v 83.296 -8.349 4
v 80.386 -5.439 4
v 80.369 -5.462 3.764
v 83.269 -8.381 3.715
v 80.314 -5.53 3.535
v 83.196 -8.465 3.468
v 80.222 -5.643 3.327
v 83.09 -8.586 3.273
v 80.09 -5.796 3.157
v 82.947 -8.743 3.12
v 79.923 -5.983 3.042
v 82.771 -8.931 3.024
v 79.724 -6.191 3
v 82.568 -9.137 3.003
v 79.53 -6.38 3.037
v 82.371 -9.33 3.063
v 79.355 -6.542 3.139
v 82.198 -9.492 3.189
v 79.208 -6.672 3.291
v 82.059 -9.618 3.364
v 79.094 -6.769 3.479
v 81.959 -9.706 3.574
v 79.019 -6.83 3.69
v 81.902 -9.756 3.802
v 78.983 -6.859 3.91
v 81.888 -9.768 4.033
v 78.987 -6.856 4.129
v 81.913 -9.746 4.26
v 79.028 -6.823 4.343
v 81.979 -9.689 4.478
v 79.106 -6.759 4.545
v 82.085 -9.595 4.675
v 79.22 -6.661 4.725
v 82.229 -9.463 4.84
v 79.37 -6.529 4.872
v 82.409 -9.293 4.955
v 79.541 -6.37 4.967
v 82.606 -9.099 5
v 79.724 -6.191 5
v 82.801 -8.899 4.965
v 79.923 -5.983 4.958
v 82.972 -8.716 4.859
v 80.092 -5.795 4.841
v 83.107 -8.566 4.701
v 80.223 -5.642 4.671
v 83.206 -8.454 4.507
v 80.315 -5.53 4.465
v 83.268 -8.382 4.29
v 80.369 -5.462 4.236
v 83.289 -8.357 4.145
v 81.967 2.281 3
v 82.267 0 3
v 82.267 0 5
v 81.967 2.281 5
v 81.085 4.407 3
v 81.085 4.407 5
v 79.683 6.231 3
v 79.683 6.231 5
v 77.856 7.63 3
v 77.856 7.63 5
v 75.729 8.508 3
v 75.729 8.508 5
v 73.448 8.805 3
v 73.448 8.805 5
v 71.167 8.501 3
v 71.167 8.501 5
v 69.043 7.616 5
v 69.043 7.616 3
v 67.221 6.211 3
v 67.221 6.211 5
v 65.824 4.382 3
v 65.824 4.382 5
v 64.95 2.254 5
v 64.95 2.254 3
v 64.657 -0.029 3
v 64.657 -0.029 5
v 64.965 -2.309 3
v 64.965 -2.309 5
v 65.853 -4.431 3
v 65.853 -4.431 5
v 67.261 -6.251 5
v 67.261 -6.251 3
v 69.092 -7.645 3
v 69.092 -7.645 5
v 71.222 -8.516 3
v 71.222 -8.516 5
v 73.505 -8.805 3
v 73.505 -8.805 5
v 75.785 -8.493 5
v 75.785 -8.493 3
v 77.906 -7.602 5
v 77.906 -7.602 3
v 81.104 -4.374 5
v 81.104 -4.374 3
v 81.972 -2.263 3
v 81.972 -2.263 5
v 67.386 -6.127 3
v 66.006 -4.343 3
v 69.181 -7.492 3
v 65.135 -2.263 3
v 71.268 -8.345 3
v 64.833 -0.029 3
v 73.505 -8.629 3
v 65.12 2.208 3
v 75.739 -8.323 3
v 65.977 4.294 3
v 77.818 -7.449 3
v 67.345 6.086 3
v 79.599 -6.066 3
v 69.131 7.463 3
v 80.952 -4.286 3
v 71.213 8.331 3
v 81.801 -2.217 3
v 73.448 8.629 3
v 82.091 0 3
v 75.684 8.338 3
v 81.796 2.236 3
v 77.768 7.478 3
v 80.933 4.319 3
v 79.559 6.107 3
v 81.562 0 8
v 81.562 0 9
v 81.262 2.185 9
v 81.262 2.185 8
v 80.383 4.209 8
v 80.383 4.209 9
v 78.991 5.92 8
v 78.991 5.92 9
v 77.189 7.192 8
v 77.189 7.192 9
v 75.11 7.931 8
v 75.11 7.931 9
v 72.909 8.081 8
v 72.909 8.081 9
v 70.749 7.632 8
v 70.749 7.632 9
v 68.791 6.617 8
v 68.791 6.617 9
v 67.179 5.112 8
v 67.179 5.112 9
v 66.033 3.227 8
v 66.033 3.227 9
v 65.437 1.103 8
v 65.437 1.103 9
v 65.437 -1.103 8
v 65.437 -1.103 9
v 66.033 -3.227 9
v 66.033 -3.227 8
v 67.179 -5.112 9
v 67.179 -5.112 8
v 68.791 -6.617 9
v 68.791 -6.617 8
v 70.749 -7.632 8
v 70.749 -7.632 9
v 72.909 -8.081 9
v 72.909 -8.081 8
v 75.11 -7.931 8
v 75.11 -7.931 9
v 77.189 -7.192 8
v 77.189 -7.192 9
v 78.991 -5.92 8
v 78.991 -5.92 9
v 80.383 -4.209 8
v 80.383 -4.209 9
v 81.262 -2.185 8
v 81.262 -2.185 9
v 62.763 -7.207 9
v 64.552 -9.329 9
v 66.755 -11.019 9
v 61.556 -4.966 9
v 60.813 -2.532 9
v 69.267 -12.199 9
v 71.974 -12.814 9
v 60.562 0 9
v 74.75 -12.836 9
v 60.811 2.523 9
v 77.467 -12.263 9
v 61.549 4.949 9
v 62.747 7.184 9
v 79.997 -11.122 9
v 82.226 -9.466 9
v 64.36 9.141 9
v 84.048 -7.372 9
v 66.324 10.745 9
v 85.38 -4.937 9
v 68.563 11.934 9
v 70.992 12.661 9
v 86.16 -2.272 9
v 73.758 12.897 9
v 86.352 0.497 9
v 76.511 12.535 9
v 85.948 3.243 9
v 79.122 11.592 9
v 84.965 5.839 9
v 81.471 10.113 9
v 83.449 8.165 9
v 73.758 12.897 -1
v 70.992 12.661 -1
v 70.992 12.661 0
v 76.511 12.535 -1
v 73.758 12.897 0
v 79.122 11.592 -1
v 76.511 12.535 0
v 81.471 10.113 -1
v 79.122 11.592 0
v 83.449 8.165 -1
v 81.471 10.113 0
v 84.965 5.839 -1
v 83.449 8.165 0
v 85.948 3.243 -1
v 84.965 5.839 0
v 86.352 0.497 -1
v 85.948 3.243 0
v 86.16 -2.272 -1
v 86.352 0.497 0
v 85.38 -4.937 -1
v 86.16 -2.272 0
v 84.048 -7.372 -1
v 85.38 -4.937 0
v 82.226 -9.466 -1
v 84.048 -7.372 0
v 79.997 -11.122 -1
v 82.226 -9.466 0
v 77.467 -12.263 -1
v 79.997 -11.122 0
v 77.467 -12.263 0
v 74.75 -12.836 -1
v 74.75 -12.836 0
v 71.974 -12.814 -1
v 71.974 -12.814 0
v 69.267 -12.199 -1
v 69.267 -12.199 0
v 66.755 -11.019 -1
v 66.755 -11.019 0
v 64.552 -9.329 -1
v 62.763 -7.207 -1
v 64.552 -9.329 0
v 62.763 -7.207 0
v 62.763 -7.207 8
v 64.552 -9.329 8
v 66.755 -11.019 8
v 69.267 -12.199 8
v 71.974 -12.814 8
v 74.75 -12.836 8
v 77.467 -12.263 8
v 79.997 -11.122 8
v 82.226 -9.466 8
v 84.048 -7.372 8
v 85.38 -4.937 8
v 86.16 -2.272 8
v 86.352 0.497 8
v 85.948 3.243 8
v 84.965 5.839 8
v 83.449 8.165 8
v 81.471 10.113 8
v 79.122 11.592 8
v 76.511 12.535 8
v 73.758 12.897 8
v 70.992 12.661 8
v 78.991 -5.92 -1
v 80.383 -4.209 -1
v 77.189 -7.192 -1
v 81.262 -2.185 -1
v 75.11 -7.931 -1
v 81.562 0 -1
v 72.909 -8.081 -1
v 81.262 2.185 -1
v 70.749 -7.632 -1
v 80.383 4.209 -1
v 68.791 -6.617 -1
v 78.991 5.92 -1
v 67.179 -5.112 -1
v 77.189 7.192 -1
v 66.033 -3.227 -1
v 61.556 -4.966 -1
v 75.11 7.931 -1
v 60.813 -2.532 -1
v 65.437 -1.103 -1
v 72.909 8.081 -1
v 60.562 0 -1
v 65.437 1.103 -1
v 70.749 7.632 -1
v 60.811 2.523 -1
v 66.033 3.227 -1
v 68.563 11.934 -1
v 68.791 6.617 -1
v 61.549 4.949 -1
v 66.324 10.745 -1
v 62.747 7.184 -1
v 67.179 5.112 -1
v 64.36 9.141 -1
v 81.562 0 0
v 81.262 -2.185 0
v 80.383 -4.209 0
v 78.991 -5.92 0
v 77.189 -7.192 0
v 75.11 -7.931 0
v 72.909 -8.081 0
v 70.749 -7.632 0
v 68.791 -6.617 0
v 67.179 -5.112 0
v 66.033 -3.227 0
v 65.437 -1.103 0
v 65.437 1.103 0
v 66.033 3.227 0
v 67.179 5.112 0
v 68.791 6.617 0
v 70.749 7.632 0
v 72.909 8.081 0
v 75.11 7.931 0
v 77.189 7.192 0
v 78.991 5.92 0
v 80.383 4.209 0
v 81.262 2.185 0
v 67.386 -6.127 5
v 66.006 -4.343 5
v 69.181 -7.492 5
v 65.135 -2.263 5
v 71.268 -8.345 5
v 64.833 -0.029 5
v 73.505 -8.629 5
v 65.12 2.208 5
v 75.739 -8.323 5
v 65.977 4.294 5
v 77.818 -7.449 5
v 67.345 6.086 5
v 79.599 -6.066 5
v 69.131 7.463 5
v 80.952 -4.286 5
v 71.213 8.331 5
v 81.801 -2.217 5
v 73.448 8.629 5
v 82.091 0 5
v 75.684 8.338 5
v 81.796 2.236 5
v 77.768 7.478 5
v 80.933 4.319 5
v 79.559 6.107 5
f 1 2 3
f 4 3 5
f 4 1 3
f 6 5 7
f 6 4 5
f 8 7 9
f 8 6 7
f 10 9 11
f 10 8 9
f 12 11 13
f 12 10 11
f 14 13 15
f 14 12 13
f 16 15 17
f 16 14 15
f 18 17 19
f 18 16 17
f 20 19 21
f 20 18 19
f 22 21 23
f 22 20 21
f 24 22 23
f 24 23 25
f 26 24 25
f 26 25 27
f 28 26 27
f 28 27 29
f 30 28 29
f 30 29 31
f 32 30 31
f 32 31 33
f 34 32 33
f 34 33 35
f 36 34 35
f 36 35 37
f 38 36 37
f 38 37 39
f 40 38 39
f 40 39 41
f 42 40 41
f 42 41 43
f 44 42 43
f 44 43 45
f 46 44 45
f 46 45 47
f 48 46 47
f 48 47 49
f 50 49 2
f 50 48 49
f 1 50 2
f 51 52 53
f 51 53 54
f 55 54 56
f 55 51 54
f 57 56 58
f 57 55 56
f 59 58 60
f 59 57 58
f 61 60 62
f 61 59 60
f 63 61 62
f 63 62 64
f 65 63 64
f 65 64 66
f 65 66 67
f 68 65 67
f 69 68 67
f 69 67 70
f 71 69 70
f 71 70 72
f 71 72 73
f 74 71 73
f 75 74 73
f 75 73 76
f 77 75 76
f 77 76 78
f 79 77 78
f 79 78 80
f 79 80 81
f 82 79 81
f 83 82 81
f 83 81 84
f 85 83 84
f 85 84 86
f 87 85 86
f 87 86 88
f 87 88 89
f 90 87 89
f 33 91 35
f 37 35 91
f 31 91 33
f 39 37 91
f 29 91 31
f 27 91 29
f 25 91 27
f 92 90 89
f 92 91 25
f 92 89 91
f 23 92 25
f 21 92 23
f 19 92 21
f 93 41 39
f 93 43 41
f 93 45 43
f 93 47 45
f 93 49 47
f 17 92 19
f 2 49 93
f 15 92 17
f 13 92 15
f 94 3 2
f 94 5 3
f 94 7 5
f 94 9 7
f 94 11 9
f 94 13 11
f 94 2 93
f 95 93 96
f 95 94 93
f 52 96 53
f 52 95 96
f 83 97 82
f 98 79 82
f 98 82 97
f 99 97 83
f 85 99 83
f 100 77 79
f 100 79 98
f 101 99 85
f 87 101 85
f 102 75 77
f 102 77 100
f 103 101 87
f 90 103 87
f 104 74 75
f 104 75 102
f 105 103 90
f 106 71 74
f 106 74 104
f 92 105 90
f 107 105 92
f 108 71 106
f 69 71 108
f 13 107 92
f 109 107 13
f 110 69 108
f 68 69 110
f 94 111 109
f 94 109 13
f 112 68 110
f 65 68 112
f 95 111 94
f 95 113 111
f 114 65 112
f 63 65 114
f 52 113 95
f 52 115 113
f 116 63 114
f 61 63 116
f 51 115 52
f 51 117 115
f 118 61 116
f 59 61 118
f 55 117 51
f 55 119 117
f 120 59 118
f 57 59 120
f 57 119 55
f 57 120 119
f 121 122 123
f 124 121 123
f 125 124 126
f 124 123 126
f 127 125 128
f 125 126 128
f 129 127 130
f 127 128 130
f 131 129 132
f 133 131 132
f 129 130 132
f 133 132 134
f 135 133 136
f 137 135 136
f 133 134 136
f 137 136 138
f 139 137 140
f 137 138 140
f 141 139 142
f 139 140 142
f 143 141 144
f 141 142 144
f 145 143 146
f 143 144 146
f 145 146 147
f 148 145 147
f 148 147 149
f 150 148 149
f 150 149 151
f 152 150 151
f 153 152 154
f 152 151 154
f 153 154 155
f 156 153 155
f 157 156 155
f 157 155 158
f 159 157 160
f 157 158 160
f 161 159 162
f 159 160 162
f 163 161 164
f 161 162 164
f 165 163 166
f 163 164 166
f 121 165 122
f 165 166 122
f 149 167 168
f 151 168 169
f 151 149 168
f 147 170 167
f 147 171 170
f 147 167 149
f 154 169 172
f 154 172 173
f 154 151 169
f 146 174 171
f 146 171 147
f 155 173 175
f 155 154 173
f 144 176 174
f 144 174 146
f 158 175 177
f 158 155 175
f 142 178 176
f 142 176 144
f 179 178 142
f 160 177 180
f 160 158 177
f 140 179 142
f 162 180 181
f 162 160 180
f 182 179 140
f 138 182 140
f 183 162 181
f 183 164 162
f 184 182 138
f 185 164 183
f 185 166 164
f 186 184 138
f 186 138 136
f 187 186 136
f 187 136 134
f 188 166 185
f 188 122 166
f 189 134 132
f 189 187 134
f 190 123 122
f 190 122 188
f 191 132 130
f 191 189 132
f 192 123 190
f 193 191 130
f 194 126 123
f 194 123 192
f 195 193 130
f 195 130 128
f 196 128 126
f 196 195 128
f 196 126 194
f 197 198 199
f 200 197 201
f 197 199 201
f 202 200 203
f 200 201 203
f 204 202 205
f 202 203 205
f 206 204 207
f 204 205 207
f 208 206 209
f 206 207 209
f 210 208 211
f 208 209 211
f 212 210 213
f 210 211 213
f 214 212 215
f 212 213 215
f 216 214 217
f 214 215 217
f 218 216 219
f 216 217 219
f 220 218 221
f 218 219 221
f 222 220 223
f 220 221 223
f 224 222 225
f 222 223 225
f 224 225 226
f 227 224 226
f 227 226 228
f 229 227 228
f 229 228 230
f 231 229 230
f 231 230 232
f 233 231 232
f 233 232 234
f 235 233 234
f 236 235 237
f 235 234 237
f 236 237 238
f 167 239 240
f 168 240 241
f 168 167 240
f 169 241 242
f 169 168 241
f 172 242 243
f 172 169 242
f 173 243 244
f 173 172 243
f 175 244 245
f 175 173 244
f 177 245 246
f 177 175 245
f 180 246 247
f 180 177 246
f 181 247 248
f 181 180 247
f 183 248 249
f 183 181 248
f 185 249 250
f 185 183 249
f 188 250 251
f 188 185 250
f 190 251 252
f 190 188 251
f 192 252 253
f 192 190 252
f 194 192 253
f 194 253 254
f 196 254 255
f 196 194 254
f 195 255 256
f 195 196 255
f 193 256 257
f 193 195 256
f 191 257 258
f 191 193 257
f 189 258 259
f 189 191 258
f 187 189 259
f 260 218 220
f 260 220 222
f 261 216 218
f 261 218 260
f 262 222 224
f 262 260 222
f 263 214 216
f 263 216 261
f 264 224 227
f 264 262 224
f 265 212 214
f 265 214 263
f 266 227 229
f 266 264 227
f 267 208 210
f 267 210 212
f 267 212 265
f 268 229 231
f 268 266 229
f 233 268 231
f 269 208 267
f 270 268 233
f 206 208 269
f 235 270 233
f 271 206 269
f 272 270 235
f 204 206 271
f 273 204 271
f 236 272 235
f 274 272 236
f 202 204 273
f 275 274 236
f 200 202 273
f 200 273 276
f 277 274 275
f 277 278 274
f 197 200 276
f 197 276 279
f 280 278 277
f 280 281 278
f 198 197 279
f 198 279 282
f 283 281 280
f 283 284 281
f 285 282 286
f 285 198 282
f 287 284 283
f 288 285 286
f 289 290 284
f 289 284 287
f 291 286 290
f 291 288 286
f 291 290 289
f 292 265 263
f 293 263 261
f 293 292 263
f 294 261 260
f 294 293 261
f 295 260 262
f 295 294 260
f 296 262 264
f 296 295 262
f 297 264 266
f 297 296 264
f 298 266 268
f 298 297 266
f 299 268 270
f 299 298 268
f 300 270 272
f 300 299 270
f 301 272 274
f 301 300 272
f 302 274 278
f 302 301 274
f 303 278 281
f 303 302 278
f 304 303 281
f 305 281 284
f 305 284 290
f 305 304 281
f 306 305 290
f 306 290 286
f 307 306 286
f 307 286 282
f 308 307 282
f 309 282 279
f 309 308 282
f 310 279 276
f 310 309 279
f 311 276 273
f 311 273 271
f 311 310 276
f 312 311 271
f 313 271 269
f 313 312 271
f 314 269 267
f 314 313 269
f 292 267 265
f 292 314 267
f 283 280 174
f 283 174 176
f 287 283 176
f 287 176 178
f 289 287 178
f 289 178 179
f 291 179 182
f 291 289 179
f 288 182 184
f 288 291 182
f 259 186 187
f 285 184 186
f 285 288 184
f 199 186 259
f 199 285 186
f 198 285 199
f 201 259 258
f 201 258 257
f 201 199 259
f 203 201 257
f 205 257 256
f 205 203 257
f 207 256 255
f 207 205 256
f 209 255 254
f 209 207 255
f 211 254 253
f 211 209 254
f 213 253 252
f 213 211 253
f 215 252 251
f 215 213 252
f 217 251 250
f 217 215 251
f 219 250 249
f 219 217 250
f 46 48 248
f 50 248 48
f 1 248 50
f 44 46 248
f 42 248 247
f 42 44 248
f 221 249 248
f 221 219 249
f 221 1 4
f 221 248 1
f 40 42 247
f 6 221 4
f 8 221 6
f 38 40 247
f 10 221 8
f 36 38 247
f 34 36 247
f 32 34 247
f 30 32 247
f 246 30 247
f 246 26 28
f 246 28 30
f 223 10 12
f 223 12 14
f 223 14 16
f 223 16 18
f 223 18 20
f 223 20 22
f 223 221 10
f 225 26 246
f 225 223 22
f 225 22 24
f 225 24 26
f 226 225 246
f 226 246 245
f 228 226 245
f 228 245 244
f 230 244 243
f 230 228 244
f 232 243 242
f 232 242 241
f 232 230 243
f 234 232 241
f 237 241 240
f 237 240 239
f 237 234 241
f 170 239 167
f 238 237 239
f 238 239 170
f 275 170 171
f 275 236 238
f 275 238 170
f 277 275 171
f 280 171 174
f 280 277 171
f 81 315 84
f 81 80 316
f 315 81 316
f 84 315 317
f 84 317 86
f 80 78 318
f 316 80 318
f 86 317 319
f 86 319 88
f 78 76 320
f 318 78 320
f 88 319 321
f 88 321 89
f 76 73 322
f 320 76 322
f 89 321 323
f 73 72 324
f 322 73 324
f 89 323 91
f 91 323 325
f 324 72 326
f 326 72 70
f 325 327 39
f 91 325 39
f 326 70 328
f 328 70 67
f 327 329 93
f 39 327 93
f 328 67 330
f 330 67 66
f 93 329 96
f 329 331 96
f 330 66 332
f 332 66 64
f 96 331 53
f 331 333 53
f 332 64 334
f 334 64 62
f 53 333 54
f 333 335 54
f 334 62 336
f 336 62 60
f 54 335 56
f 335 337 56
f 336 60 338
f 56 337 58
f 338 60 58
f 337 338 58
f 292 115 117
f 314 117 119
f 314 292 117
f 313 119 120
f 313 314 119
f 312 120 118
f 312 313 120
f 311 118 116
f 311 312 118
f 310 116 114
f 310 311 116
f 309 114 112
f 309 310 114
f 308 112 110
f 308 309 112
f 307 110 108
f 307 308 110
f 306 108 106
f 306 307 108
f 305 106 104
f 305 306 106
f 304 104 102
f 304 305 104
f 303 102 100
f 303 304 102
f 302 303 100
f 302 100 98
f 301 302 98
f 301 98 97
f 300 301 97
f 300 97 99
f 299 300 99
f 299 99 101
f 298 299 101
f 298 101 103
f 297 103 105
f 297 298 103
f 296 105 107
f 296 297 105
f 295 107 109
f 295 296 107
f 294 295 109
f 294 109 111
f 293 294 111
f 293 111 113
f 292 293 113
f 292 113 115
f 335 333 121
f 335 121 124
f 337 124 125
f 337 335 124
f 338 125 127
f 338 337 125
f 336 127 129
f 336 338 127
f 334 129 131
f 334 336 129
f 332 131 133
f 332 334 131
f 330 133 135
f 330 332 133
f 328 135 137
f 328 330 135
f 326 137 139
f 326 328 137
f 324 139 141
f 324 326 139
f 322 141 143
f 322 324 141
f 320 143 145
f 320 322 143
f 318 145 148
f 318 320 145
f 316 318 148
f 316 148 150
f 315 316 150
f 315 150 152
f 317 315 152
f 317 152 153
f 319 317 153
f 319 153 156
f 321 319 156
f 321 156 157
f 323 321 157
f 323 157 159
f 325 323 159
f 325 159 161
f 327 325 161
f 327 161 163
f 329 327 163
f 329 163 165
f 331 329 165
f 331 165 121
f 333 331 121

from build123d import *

# Parameters (mm, degrees)
SKETCH1_R               = 12.9
SKETCH1_R_2             = 8.1
BOSS_EXTRUDE1_DEPTH     = 8
CUT_EXTRUDE1_DEPTH      = 1
CUT_EXTRUDE1_DEPTH_BACK = 1
SKETCH3_R               = 8.805307923
SKETCH4_R               = 1
CUT_EXTRUDE2_DEPTH      = 6
FILLET1_R               = 3
FILLET2_R               = 5
SKETCH5_R               = 1
CUT_EXTRUDE3_DEPTH      = 10
DRAFT4_ANGLE            = -10
DRAFT6_ANGLE            = -10
SKETCH6_R               = 1
CUT_EXTRUDE4_DEPTH      = 10
BOSS_EXTRUDE3_START     = 1
SKETCH7_R               = 8.1
BOSS_EXTRUDE3_DEPTH     = 1
SKETCH11_R              = 8.1
BOSS_EXTRUDE4_DEPTH     = 1
SKETCH12_OUTSIDE_W      = 157.242
SKETCH12_OUTSIDE_H      = 107.242
SKETCH12_OUTSIDE_R      = 12.9
CUT_EXTRUDE5_DEPTH      = 108.3070569


with BuildPart() as part:
    # Sketch1 → Boss-Extrude1 (new body)
    # profile 1 of 8: a face of its own
    with BuildSketch(Plane.XY):
        with Locations((-26.538003558, 0)):
            Circle(SKETCH1_R)
        with Locations((-26.538003558, 0)):
            Circle(SKETCH1_R_2, mode=Mode.SUBTRACT)
    # profile 2 of 8: a face of its own
    with BuildSketch(Plane.XY):
        with BuildLine():
            ThreePointArc((-21.664910941, 11.944160429), (-17.46502072, 9.170113544), (-14.646409889, 5))
            Line((-14.646409889, 5), (-14.466935746, 5))
            Line((-14.466935746, 5), (18.588903825, 38.055839571))
            ThreePointArc((18.588903825, 38.055839571), (14.340318965, 40.878322523), (11.517836013, 45.126907383))
            Line((11.517836013, 45.126907383), (-21.664910941, 11.944160429))
        make_face()
    # profile 3 of 8: a face of its own
    with BuildSketch(Plane.XY):
        with BuildLine():
            Line((-14.466935746, 5), (-14.646409889, 5))
            ThreePointArc((-14.646409889, 5), (-14.619957589, 4.936616278), (-14.593843129, 4.873092617))
            Line((-14.593843129, 4.873092617), (-14.466935746, 5))
        make_face()
    # profile 4 of 8: a face of its own
    with BuildSketch(Plane.XY):
        with BuildLine():
            Line((61.39092863, 5), (-14.466935746, 5))
            Line((-14.466935746, 5), (-14.593843129, 4.873092617))
            ThreePointArc((-14.593843129, 4.873092617), (-13.879218673, 2.482975077), (-13.638003558, 0))
            ThreePointArc((-13.638003558, 0), (-13.892617871, -2.550337396), (-14.646409889, -5))
            Line((-14.646409889, -5), (61.570402773, -5))
            ThreePointArc((61.570402773, -5), (60.56217928, -0.068681781), (61.517836013, 4.873092617))
            Line((61.517836013, 4.873092617), (61.39092863, 5))
        make_face()
    # profile 5 of 8: a face of its own
    with BuildSketch(Plane.XY):
        with Locations((23.461996442, 50)):
            Circle(SKETCH1_R)
        with Locations((23.461996442, 50)):
            Circle(SKETCH1_R_2, mode=Mode.SUBTRACT)
    # profile 6 of 8: a face of its own
    with BuildSketch(Plane.XY):
        with BuildLine():
            Line((28.335089059, 38.055839571), (61.39092863, 5))
            Line((61.39092863, 5), (61.570402773, 5))
            ThreePointArc((61.570402773, 5), (64.389013604, 9.170113544), (68.588903825, 11.944160429))
            Line((68.588903825, 11.944160429), (35.406156871, 45.126907383))
            ThreePointArc((35.406156871, 45.126907383), (32.583673919, 40.878322523), (28.335089059, 38.055839571))
        make_face()
    # profile 7 of 8: a face of its own
    with BuildSketch(Plane.XY):
        with Locations((73.461996442, 0)):
            Circle(SKETCH1_R)
        with Locations((73.461996442, 0)):
            Circle(SKETCH1_R_2, mode=Mode.SUBTRACT)
    # profile 8 of 8: a face of its own
    with BuildSketch(Plane.XY):
        with BuildLine():
            Line((61.570402773, 5), (61.39092863, 5))
            Line((61.39092863, 5), (61.517836013, 4.873092617))
            ThreePointArc((61.517836013, 4.873092617), (61.543950473, 4.936616278), (61.570402773, 5))
        make_face()
    extrude(amount=BOSS_EXTRUDE1_DEPTH)

    # Sketch3 → Cut-Extrude1 (cut, two sides: drawn at the far end of the back side and taken through both)
    with BuildSketch(Plane.XY.offset(4).offset(-CUT_EXTRUDE1_DEPTH_BACK)):
        with Locations((-26.538003558, 0)):
            Circle(SKETCH3_R)
        with Locations((23.461996442, 50)):
            Circle(SKETCH3_R)
        with Locations((73.461996442, 0)):
            Circle(SKETCH3_R)
    extrude(amount=CUT_EXTRUDE1_DEPTH + CUT_EXTRUDE1_DEPTH_BACK, mode=Mode.SUBTRACT)

    # Sketch4 → Cut-Extrude2 (cut)
    with BuildSketch(Plane(origin=(0, 63.1, 0), x_dir=(-1, 0, 0), z_dir=(0, -1, 0))):
        with Locations(Location((-23.511996442, -4, 0), (0, 0, 270))):
            Circle(SKETCH4_R)
    extrude(amount=CUT_EXTRUDE2_DEPTH, mode=Mode.SUBTRACT)

    # Fillet1
    fillet1_edges = [part.edges().sort_by_distance(p)[0] for p in [
        (61.39092863, 5, 4),
        (28.335089059, 38.055839571, 4),
        (18.588903825, 38.055839571, 4),
        (-14.466935746, 5, 4),
    ]]
    fillet(fillet1_edges, radius=FILLET1_R)

    # Fillet2
    fillet2_edges = [part.edges().sort_by_distance(p)[0] for p in [
        (68.588903825, 11.944160429, 4),
        (61.570402773, -5, 4),
        (-14.646409889, -5, 4),
        (-21.664910941, 11.944160429, 4),
        (11.517836013, 45.126907383, 4),
        (35.406156871, 45.126907383, 4),
    ]]
    fillet(fillet2_edges, radius=FILLET2_R)

    # Sketch5 → Cut-Extrude3 (cut)
    with BuildSketch(Plane(origin=(45.994097055, -45.994097055, 0), x_dir=(0, 0, 1), z_dir=(-0.7071067811865489, 0.7071067811865462, 0))):
        with Locations(Location((4, 51.995475844, 0), (0, 0, 90))):
            Circle(SKETCH5_R)
    extrude(amount=CUT_EXTRUDE3_DEPTH, mode=Mode.SUBTRACT)

    # Draft4
    draft4_faces = [part.faces().sort_by_distance(p)[0] for p in [
        (-34.638003558, 0, 6.5),
        (15.361996442, 50, 6.5),
        (65.361996442, 0, 6.5),
    ]]
    draft(draft4_faces, Plane.XY.offset(8), DRAFT4_ANGLE)

    # Draft6
    draft6_faces = [part.faces().sort_by_distance(p)[0] for p in [
        (-34.638003558, 0, 1.5),
        (65.361996442, 0, 1.5),
        (15.361996442, 50, 1.5),
    ]]
    draft(draft6_faces, Plane(origin=(0, 0, 0), x_dir=(-1, 0, 0), z_dir=(0, 0, -1)), DRAFT6_ANGLE)

    # Sketch6 → Cut-Extrude4 (cut)
    with BuildSketch(Plane(origin=(-22.532100613, -22.532100613, 0), x_dir=(0, 0, -1), z_dir=(0.7071067811865486, 0.7071067811865465, 0))):
        with Locations(Location((-4, 18.715202275, 0), (0, 0, 270))):
            Circle(SKETCH6_R)
    extrude(amount=CUT_EXTRUDE4_DEPTH, mode=Mode.SUBTRACT)

    # Sketch7 → Boss-Extrude3 (add)
    with BuildSketch(Plane.XY.offset(8).offset(BOSS_EXTRUDE3_START)):
        with BuildLine():
            Line((66.499673424, 14.03339083), (37.495387272, 43.037676982))
            ThreePointArc((37.495387272, 43.037676982), (36.248927219, 45.112891138), (36.123400302, 47.53041455))
            ThreePointArc((36.123400302, 47.53041455), (23.461996442, 62.9), (10.800592582, 47.53041455))
            ThreePointArc((10.800592582, 47.53041455), (10.675065665, 45.112891138), (9.428605612, 43.037676982))
            Line((9.428605612, 43.037676982), (-19.57568054, 14.03339083))
            ThreePointArc((-19.57568054, 14.03339083), (-21.650894696, 12.786930777), (-24.068418108, 12.66140386))
            ThreePointArc((-24.068418108, 12.66140386), (-38.456049527, -4.936616278), (-15.838778411, -7.206703911))
            ThreePointArc((-15.838778411, -7.206703911), (-14.040570278, -5.586017646), (-11.69179192, -5))
            Line((-11.69179192, -5), (58.615784804, -5))
            ThreePointArc((58.615784804, -5), (60.964563162, -5.586017646), (62.762771295, -7.206703911))
            ThreePointArc((62.762771295, -7.206703911), (85.380042411, -4.936616278), (70.992410992, 12.66140386))
            ThreePointArc((70.992410992, 12.66140386), (68.57488758, 12.786930777), (66.499673424, 14.03339083))
        make_face()
        with Locations((-26.538003558, 0)):
            Circle(SKETCH7_R, mode=Mode.SUBTRACT)
        with Locations((73.461996442, 0)):
            Circle(SKETCH7_R, mode=Mode.SUBTRACT)
        with Locations((23.461996442, 50)):
            Circle(SKETCH7_R, mode=Mode.SUBTRACT)
        with BuildLine():
            Line((-7.224295059, 5), (54.148287943, 5))
            ThreePointArc((54.148287943, 5), (56.919926541, 6.851949703), (56.269608287, 10.121320344))
            Line((56.269608287, 10.121320344), (29.642686082, 36.748242548))
            ThreePointArc((29.642686082, 36.748242548), (28.303088236, 37.523283704), (26.755447003, 37.52750292))
            ThreePointArc((26.755447003, 37.52750292), (23.461996442, 37.1), (20.168545881, 37.52750292))
            ThreePointArc((20.168545881, 37.52750292), (18.620904648, 37.523283704), (17.281306802, 36.748242548))
            Line((17.281306802, 36.748242548), (-9.345615403, 10.121320344))
            ThreePointArc((-9.345615403, 10.121320344), (-9.995933657, 6.851949703), (-7.224295059, 5))
        make_face(mode=Mode.SUBTRACT)
    extrude(amount=-BOSS_EXTRUDE3_DEPTH)

    # Sketch11 → Boss-Extrude4 (add)
    with BuildSketch(Plane(origin=(0, 0, 0), x_dir=(-1, 0, 0), z_dir=(0, 0, -1))):
        with BuildLine():
            Line((-37.495387272, 43.037676982), (-66.499673424, 14.03339083))
            ThreePointArc((-66.499673424, 14.03339083), (-68.57488758, 12.786930777), (-70.992410992, 12.66140386))
            ThreePointArc((-70.992410992, 12.66140386), (-85.380042411, -4.936616278), (-62.762771295, -7.206703911))
            ThreePointArc((-62.762771295, -7.206703911), (-60.964563162, -5.586017646), (-58.615784804, -5))
            Line((-58.615784804, -5), (11.69179192, -5))
            ThreePointArc((11.69179192, -5), (14.040570278, -5.586017646), (15.838778411, -7.206703911))
            ThreePointArc((15.838778411, -7.206703911), (38.456049527, -4.936616278), (24.068418108, 12.66140386))
            ThreePointArc((24.068418108, 12.66140386), (21.650894696, 12.786930777), (19.57568054, 14.03339083))
            Line((19.57568054, 14.03339083), (-9.428605612, 43.037676982))
            ThreePointArc((-9.428605612, 43.037676982), (-10.675065665, 45.112891138), (-10.800592582, 47.53041455))
            ThreePointArc((-10.800592582, 47.53041455), (-23.461996442, 62.9), (-36.123400302, 47.53041455))
            ThreePointArc((-36.123400302, 47.53041455), (-36.248927219, 45.112891138), (-37.495387272, 43.037676982))
        make_face()
        with Locations(Location((-73.461996442, 0, 0), (0, 0, 180))):
            Circle(SKETCH11_R, mode=Mode.SUBTRACT)
        with Locations(Location((-23.461996442, 50, 0), (0, 0, 180))):
            Circle(SKETCH11_R, mode=Mode.SUBTRACT)
        with Locations(Location((26.538003558, 0, 0), (0, 0, 180))):
            Circle(SKETCH11_R, mode=Mode.SUBTRACT)
        with BuildLine():
            Line((-17.281306802, 36.748242548), (9.345615403, 10.121320344))
            ThreePointArc((9.345615403, 10.121320344), (9.995933657, 6.851949703), (7.224295059, 5))
            Line((7.224295059, 5), (-54.148287943, 5))
            ThreePointArc((-54.148287943, 5), (-56.919926541, 6.851949703), (-56.269608287, 10.121320344))
            Line((-56.269608287, 10.121320344), (-29.642686082, 36.748242548))
            ThreePointArc((-29.642686082, 36.748242548), (-28.303088236, 37.523283704), (-26.755447003, 37.52750292))
            ThreePointArc((-26.755447003, 37.52750292), (-23.461996442, 37.1), (-20.168545881, 37.52750292))
            ThreePointArc((-20.168545881, 37.52750292), (-18.620904648, 37.523283704), (-17.281306802, 36.748242548))
        make_face(mode=Mode.SUBTRACT)
    extrude(amount=BOSS_EXTRUDE4_DEPTH)

    # Sketch12 outside → Cut-Extrude5 (cut, through all)
    with BuildSketch(Plane(origin=(0, 0, -1), x_dir=(-1, 0, 0), z_dir=(0, 0, -1))):
        with Locations((-23.462, 25)):
            Rectangle(SKETCH12_OUTSIDE_W, SKETCH12_OUTSIDE_H)
        with Locations((-73.461996442, 0)):
            Circle(SKETCH12_OUTSIDE_R, mode=Mode.SUBTRACT)
    extrude(amount=-CUT_EXTRUDE5_DEPTH, mode=Mode.SUBTRACT)


solid = part.part
